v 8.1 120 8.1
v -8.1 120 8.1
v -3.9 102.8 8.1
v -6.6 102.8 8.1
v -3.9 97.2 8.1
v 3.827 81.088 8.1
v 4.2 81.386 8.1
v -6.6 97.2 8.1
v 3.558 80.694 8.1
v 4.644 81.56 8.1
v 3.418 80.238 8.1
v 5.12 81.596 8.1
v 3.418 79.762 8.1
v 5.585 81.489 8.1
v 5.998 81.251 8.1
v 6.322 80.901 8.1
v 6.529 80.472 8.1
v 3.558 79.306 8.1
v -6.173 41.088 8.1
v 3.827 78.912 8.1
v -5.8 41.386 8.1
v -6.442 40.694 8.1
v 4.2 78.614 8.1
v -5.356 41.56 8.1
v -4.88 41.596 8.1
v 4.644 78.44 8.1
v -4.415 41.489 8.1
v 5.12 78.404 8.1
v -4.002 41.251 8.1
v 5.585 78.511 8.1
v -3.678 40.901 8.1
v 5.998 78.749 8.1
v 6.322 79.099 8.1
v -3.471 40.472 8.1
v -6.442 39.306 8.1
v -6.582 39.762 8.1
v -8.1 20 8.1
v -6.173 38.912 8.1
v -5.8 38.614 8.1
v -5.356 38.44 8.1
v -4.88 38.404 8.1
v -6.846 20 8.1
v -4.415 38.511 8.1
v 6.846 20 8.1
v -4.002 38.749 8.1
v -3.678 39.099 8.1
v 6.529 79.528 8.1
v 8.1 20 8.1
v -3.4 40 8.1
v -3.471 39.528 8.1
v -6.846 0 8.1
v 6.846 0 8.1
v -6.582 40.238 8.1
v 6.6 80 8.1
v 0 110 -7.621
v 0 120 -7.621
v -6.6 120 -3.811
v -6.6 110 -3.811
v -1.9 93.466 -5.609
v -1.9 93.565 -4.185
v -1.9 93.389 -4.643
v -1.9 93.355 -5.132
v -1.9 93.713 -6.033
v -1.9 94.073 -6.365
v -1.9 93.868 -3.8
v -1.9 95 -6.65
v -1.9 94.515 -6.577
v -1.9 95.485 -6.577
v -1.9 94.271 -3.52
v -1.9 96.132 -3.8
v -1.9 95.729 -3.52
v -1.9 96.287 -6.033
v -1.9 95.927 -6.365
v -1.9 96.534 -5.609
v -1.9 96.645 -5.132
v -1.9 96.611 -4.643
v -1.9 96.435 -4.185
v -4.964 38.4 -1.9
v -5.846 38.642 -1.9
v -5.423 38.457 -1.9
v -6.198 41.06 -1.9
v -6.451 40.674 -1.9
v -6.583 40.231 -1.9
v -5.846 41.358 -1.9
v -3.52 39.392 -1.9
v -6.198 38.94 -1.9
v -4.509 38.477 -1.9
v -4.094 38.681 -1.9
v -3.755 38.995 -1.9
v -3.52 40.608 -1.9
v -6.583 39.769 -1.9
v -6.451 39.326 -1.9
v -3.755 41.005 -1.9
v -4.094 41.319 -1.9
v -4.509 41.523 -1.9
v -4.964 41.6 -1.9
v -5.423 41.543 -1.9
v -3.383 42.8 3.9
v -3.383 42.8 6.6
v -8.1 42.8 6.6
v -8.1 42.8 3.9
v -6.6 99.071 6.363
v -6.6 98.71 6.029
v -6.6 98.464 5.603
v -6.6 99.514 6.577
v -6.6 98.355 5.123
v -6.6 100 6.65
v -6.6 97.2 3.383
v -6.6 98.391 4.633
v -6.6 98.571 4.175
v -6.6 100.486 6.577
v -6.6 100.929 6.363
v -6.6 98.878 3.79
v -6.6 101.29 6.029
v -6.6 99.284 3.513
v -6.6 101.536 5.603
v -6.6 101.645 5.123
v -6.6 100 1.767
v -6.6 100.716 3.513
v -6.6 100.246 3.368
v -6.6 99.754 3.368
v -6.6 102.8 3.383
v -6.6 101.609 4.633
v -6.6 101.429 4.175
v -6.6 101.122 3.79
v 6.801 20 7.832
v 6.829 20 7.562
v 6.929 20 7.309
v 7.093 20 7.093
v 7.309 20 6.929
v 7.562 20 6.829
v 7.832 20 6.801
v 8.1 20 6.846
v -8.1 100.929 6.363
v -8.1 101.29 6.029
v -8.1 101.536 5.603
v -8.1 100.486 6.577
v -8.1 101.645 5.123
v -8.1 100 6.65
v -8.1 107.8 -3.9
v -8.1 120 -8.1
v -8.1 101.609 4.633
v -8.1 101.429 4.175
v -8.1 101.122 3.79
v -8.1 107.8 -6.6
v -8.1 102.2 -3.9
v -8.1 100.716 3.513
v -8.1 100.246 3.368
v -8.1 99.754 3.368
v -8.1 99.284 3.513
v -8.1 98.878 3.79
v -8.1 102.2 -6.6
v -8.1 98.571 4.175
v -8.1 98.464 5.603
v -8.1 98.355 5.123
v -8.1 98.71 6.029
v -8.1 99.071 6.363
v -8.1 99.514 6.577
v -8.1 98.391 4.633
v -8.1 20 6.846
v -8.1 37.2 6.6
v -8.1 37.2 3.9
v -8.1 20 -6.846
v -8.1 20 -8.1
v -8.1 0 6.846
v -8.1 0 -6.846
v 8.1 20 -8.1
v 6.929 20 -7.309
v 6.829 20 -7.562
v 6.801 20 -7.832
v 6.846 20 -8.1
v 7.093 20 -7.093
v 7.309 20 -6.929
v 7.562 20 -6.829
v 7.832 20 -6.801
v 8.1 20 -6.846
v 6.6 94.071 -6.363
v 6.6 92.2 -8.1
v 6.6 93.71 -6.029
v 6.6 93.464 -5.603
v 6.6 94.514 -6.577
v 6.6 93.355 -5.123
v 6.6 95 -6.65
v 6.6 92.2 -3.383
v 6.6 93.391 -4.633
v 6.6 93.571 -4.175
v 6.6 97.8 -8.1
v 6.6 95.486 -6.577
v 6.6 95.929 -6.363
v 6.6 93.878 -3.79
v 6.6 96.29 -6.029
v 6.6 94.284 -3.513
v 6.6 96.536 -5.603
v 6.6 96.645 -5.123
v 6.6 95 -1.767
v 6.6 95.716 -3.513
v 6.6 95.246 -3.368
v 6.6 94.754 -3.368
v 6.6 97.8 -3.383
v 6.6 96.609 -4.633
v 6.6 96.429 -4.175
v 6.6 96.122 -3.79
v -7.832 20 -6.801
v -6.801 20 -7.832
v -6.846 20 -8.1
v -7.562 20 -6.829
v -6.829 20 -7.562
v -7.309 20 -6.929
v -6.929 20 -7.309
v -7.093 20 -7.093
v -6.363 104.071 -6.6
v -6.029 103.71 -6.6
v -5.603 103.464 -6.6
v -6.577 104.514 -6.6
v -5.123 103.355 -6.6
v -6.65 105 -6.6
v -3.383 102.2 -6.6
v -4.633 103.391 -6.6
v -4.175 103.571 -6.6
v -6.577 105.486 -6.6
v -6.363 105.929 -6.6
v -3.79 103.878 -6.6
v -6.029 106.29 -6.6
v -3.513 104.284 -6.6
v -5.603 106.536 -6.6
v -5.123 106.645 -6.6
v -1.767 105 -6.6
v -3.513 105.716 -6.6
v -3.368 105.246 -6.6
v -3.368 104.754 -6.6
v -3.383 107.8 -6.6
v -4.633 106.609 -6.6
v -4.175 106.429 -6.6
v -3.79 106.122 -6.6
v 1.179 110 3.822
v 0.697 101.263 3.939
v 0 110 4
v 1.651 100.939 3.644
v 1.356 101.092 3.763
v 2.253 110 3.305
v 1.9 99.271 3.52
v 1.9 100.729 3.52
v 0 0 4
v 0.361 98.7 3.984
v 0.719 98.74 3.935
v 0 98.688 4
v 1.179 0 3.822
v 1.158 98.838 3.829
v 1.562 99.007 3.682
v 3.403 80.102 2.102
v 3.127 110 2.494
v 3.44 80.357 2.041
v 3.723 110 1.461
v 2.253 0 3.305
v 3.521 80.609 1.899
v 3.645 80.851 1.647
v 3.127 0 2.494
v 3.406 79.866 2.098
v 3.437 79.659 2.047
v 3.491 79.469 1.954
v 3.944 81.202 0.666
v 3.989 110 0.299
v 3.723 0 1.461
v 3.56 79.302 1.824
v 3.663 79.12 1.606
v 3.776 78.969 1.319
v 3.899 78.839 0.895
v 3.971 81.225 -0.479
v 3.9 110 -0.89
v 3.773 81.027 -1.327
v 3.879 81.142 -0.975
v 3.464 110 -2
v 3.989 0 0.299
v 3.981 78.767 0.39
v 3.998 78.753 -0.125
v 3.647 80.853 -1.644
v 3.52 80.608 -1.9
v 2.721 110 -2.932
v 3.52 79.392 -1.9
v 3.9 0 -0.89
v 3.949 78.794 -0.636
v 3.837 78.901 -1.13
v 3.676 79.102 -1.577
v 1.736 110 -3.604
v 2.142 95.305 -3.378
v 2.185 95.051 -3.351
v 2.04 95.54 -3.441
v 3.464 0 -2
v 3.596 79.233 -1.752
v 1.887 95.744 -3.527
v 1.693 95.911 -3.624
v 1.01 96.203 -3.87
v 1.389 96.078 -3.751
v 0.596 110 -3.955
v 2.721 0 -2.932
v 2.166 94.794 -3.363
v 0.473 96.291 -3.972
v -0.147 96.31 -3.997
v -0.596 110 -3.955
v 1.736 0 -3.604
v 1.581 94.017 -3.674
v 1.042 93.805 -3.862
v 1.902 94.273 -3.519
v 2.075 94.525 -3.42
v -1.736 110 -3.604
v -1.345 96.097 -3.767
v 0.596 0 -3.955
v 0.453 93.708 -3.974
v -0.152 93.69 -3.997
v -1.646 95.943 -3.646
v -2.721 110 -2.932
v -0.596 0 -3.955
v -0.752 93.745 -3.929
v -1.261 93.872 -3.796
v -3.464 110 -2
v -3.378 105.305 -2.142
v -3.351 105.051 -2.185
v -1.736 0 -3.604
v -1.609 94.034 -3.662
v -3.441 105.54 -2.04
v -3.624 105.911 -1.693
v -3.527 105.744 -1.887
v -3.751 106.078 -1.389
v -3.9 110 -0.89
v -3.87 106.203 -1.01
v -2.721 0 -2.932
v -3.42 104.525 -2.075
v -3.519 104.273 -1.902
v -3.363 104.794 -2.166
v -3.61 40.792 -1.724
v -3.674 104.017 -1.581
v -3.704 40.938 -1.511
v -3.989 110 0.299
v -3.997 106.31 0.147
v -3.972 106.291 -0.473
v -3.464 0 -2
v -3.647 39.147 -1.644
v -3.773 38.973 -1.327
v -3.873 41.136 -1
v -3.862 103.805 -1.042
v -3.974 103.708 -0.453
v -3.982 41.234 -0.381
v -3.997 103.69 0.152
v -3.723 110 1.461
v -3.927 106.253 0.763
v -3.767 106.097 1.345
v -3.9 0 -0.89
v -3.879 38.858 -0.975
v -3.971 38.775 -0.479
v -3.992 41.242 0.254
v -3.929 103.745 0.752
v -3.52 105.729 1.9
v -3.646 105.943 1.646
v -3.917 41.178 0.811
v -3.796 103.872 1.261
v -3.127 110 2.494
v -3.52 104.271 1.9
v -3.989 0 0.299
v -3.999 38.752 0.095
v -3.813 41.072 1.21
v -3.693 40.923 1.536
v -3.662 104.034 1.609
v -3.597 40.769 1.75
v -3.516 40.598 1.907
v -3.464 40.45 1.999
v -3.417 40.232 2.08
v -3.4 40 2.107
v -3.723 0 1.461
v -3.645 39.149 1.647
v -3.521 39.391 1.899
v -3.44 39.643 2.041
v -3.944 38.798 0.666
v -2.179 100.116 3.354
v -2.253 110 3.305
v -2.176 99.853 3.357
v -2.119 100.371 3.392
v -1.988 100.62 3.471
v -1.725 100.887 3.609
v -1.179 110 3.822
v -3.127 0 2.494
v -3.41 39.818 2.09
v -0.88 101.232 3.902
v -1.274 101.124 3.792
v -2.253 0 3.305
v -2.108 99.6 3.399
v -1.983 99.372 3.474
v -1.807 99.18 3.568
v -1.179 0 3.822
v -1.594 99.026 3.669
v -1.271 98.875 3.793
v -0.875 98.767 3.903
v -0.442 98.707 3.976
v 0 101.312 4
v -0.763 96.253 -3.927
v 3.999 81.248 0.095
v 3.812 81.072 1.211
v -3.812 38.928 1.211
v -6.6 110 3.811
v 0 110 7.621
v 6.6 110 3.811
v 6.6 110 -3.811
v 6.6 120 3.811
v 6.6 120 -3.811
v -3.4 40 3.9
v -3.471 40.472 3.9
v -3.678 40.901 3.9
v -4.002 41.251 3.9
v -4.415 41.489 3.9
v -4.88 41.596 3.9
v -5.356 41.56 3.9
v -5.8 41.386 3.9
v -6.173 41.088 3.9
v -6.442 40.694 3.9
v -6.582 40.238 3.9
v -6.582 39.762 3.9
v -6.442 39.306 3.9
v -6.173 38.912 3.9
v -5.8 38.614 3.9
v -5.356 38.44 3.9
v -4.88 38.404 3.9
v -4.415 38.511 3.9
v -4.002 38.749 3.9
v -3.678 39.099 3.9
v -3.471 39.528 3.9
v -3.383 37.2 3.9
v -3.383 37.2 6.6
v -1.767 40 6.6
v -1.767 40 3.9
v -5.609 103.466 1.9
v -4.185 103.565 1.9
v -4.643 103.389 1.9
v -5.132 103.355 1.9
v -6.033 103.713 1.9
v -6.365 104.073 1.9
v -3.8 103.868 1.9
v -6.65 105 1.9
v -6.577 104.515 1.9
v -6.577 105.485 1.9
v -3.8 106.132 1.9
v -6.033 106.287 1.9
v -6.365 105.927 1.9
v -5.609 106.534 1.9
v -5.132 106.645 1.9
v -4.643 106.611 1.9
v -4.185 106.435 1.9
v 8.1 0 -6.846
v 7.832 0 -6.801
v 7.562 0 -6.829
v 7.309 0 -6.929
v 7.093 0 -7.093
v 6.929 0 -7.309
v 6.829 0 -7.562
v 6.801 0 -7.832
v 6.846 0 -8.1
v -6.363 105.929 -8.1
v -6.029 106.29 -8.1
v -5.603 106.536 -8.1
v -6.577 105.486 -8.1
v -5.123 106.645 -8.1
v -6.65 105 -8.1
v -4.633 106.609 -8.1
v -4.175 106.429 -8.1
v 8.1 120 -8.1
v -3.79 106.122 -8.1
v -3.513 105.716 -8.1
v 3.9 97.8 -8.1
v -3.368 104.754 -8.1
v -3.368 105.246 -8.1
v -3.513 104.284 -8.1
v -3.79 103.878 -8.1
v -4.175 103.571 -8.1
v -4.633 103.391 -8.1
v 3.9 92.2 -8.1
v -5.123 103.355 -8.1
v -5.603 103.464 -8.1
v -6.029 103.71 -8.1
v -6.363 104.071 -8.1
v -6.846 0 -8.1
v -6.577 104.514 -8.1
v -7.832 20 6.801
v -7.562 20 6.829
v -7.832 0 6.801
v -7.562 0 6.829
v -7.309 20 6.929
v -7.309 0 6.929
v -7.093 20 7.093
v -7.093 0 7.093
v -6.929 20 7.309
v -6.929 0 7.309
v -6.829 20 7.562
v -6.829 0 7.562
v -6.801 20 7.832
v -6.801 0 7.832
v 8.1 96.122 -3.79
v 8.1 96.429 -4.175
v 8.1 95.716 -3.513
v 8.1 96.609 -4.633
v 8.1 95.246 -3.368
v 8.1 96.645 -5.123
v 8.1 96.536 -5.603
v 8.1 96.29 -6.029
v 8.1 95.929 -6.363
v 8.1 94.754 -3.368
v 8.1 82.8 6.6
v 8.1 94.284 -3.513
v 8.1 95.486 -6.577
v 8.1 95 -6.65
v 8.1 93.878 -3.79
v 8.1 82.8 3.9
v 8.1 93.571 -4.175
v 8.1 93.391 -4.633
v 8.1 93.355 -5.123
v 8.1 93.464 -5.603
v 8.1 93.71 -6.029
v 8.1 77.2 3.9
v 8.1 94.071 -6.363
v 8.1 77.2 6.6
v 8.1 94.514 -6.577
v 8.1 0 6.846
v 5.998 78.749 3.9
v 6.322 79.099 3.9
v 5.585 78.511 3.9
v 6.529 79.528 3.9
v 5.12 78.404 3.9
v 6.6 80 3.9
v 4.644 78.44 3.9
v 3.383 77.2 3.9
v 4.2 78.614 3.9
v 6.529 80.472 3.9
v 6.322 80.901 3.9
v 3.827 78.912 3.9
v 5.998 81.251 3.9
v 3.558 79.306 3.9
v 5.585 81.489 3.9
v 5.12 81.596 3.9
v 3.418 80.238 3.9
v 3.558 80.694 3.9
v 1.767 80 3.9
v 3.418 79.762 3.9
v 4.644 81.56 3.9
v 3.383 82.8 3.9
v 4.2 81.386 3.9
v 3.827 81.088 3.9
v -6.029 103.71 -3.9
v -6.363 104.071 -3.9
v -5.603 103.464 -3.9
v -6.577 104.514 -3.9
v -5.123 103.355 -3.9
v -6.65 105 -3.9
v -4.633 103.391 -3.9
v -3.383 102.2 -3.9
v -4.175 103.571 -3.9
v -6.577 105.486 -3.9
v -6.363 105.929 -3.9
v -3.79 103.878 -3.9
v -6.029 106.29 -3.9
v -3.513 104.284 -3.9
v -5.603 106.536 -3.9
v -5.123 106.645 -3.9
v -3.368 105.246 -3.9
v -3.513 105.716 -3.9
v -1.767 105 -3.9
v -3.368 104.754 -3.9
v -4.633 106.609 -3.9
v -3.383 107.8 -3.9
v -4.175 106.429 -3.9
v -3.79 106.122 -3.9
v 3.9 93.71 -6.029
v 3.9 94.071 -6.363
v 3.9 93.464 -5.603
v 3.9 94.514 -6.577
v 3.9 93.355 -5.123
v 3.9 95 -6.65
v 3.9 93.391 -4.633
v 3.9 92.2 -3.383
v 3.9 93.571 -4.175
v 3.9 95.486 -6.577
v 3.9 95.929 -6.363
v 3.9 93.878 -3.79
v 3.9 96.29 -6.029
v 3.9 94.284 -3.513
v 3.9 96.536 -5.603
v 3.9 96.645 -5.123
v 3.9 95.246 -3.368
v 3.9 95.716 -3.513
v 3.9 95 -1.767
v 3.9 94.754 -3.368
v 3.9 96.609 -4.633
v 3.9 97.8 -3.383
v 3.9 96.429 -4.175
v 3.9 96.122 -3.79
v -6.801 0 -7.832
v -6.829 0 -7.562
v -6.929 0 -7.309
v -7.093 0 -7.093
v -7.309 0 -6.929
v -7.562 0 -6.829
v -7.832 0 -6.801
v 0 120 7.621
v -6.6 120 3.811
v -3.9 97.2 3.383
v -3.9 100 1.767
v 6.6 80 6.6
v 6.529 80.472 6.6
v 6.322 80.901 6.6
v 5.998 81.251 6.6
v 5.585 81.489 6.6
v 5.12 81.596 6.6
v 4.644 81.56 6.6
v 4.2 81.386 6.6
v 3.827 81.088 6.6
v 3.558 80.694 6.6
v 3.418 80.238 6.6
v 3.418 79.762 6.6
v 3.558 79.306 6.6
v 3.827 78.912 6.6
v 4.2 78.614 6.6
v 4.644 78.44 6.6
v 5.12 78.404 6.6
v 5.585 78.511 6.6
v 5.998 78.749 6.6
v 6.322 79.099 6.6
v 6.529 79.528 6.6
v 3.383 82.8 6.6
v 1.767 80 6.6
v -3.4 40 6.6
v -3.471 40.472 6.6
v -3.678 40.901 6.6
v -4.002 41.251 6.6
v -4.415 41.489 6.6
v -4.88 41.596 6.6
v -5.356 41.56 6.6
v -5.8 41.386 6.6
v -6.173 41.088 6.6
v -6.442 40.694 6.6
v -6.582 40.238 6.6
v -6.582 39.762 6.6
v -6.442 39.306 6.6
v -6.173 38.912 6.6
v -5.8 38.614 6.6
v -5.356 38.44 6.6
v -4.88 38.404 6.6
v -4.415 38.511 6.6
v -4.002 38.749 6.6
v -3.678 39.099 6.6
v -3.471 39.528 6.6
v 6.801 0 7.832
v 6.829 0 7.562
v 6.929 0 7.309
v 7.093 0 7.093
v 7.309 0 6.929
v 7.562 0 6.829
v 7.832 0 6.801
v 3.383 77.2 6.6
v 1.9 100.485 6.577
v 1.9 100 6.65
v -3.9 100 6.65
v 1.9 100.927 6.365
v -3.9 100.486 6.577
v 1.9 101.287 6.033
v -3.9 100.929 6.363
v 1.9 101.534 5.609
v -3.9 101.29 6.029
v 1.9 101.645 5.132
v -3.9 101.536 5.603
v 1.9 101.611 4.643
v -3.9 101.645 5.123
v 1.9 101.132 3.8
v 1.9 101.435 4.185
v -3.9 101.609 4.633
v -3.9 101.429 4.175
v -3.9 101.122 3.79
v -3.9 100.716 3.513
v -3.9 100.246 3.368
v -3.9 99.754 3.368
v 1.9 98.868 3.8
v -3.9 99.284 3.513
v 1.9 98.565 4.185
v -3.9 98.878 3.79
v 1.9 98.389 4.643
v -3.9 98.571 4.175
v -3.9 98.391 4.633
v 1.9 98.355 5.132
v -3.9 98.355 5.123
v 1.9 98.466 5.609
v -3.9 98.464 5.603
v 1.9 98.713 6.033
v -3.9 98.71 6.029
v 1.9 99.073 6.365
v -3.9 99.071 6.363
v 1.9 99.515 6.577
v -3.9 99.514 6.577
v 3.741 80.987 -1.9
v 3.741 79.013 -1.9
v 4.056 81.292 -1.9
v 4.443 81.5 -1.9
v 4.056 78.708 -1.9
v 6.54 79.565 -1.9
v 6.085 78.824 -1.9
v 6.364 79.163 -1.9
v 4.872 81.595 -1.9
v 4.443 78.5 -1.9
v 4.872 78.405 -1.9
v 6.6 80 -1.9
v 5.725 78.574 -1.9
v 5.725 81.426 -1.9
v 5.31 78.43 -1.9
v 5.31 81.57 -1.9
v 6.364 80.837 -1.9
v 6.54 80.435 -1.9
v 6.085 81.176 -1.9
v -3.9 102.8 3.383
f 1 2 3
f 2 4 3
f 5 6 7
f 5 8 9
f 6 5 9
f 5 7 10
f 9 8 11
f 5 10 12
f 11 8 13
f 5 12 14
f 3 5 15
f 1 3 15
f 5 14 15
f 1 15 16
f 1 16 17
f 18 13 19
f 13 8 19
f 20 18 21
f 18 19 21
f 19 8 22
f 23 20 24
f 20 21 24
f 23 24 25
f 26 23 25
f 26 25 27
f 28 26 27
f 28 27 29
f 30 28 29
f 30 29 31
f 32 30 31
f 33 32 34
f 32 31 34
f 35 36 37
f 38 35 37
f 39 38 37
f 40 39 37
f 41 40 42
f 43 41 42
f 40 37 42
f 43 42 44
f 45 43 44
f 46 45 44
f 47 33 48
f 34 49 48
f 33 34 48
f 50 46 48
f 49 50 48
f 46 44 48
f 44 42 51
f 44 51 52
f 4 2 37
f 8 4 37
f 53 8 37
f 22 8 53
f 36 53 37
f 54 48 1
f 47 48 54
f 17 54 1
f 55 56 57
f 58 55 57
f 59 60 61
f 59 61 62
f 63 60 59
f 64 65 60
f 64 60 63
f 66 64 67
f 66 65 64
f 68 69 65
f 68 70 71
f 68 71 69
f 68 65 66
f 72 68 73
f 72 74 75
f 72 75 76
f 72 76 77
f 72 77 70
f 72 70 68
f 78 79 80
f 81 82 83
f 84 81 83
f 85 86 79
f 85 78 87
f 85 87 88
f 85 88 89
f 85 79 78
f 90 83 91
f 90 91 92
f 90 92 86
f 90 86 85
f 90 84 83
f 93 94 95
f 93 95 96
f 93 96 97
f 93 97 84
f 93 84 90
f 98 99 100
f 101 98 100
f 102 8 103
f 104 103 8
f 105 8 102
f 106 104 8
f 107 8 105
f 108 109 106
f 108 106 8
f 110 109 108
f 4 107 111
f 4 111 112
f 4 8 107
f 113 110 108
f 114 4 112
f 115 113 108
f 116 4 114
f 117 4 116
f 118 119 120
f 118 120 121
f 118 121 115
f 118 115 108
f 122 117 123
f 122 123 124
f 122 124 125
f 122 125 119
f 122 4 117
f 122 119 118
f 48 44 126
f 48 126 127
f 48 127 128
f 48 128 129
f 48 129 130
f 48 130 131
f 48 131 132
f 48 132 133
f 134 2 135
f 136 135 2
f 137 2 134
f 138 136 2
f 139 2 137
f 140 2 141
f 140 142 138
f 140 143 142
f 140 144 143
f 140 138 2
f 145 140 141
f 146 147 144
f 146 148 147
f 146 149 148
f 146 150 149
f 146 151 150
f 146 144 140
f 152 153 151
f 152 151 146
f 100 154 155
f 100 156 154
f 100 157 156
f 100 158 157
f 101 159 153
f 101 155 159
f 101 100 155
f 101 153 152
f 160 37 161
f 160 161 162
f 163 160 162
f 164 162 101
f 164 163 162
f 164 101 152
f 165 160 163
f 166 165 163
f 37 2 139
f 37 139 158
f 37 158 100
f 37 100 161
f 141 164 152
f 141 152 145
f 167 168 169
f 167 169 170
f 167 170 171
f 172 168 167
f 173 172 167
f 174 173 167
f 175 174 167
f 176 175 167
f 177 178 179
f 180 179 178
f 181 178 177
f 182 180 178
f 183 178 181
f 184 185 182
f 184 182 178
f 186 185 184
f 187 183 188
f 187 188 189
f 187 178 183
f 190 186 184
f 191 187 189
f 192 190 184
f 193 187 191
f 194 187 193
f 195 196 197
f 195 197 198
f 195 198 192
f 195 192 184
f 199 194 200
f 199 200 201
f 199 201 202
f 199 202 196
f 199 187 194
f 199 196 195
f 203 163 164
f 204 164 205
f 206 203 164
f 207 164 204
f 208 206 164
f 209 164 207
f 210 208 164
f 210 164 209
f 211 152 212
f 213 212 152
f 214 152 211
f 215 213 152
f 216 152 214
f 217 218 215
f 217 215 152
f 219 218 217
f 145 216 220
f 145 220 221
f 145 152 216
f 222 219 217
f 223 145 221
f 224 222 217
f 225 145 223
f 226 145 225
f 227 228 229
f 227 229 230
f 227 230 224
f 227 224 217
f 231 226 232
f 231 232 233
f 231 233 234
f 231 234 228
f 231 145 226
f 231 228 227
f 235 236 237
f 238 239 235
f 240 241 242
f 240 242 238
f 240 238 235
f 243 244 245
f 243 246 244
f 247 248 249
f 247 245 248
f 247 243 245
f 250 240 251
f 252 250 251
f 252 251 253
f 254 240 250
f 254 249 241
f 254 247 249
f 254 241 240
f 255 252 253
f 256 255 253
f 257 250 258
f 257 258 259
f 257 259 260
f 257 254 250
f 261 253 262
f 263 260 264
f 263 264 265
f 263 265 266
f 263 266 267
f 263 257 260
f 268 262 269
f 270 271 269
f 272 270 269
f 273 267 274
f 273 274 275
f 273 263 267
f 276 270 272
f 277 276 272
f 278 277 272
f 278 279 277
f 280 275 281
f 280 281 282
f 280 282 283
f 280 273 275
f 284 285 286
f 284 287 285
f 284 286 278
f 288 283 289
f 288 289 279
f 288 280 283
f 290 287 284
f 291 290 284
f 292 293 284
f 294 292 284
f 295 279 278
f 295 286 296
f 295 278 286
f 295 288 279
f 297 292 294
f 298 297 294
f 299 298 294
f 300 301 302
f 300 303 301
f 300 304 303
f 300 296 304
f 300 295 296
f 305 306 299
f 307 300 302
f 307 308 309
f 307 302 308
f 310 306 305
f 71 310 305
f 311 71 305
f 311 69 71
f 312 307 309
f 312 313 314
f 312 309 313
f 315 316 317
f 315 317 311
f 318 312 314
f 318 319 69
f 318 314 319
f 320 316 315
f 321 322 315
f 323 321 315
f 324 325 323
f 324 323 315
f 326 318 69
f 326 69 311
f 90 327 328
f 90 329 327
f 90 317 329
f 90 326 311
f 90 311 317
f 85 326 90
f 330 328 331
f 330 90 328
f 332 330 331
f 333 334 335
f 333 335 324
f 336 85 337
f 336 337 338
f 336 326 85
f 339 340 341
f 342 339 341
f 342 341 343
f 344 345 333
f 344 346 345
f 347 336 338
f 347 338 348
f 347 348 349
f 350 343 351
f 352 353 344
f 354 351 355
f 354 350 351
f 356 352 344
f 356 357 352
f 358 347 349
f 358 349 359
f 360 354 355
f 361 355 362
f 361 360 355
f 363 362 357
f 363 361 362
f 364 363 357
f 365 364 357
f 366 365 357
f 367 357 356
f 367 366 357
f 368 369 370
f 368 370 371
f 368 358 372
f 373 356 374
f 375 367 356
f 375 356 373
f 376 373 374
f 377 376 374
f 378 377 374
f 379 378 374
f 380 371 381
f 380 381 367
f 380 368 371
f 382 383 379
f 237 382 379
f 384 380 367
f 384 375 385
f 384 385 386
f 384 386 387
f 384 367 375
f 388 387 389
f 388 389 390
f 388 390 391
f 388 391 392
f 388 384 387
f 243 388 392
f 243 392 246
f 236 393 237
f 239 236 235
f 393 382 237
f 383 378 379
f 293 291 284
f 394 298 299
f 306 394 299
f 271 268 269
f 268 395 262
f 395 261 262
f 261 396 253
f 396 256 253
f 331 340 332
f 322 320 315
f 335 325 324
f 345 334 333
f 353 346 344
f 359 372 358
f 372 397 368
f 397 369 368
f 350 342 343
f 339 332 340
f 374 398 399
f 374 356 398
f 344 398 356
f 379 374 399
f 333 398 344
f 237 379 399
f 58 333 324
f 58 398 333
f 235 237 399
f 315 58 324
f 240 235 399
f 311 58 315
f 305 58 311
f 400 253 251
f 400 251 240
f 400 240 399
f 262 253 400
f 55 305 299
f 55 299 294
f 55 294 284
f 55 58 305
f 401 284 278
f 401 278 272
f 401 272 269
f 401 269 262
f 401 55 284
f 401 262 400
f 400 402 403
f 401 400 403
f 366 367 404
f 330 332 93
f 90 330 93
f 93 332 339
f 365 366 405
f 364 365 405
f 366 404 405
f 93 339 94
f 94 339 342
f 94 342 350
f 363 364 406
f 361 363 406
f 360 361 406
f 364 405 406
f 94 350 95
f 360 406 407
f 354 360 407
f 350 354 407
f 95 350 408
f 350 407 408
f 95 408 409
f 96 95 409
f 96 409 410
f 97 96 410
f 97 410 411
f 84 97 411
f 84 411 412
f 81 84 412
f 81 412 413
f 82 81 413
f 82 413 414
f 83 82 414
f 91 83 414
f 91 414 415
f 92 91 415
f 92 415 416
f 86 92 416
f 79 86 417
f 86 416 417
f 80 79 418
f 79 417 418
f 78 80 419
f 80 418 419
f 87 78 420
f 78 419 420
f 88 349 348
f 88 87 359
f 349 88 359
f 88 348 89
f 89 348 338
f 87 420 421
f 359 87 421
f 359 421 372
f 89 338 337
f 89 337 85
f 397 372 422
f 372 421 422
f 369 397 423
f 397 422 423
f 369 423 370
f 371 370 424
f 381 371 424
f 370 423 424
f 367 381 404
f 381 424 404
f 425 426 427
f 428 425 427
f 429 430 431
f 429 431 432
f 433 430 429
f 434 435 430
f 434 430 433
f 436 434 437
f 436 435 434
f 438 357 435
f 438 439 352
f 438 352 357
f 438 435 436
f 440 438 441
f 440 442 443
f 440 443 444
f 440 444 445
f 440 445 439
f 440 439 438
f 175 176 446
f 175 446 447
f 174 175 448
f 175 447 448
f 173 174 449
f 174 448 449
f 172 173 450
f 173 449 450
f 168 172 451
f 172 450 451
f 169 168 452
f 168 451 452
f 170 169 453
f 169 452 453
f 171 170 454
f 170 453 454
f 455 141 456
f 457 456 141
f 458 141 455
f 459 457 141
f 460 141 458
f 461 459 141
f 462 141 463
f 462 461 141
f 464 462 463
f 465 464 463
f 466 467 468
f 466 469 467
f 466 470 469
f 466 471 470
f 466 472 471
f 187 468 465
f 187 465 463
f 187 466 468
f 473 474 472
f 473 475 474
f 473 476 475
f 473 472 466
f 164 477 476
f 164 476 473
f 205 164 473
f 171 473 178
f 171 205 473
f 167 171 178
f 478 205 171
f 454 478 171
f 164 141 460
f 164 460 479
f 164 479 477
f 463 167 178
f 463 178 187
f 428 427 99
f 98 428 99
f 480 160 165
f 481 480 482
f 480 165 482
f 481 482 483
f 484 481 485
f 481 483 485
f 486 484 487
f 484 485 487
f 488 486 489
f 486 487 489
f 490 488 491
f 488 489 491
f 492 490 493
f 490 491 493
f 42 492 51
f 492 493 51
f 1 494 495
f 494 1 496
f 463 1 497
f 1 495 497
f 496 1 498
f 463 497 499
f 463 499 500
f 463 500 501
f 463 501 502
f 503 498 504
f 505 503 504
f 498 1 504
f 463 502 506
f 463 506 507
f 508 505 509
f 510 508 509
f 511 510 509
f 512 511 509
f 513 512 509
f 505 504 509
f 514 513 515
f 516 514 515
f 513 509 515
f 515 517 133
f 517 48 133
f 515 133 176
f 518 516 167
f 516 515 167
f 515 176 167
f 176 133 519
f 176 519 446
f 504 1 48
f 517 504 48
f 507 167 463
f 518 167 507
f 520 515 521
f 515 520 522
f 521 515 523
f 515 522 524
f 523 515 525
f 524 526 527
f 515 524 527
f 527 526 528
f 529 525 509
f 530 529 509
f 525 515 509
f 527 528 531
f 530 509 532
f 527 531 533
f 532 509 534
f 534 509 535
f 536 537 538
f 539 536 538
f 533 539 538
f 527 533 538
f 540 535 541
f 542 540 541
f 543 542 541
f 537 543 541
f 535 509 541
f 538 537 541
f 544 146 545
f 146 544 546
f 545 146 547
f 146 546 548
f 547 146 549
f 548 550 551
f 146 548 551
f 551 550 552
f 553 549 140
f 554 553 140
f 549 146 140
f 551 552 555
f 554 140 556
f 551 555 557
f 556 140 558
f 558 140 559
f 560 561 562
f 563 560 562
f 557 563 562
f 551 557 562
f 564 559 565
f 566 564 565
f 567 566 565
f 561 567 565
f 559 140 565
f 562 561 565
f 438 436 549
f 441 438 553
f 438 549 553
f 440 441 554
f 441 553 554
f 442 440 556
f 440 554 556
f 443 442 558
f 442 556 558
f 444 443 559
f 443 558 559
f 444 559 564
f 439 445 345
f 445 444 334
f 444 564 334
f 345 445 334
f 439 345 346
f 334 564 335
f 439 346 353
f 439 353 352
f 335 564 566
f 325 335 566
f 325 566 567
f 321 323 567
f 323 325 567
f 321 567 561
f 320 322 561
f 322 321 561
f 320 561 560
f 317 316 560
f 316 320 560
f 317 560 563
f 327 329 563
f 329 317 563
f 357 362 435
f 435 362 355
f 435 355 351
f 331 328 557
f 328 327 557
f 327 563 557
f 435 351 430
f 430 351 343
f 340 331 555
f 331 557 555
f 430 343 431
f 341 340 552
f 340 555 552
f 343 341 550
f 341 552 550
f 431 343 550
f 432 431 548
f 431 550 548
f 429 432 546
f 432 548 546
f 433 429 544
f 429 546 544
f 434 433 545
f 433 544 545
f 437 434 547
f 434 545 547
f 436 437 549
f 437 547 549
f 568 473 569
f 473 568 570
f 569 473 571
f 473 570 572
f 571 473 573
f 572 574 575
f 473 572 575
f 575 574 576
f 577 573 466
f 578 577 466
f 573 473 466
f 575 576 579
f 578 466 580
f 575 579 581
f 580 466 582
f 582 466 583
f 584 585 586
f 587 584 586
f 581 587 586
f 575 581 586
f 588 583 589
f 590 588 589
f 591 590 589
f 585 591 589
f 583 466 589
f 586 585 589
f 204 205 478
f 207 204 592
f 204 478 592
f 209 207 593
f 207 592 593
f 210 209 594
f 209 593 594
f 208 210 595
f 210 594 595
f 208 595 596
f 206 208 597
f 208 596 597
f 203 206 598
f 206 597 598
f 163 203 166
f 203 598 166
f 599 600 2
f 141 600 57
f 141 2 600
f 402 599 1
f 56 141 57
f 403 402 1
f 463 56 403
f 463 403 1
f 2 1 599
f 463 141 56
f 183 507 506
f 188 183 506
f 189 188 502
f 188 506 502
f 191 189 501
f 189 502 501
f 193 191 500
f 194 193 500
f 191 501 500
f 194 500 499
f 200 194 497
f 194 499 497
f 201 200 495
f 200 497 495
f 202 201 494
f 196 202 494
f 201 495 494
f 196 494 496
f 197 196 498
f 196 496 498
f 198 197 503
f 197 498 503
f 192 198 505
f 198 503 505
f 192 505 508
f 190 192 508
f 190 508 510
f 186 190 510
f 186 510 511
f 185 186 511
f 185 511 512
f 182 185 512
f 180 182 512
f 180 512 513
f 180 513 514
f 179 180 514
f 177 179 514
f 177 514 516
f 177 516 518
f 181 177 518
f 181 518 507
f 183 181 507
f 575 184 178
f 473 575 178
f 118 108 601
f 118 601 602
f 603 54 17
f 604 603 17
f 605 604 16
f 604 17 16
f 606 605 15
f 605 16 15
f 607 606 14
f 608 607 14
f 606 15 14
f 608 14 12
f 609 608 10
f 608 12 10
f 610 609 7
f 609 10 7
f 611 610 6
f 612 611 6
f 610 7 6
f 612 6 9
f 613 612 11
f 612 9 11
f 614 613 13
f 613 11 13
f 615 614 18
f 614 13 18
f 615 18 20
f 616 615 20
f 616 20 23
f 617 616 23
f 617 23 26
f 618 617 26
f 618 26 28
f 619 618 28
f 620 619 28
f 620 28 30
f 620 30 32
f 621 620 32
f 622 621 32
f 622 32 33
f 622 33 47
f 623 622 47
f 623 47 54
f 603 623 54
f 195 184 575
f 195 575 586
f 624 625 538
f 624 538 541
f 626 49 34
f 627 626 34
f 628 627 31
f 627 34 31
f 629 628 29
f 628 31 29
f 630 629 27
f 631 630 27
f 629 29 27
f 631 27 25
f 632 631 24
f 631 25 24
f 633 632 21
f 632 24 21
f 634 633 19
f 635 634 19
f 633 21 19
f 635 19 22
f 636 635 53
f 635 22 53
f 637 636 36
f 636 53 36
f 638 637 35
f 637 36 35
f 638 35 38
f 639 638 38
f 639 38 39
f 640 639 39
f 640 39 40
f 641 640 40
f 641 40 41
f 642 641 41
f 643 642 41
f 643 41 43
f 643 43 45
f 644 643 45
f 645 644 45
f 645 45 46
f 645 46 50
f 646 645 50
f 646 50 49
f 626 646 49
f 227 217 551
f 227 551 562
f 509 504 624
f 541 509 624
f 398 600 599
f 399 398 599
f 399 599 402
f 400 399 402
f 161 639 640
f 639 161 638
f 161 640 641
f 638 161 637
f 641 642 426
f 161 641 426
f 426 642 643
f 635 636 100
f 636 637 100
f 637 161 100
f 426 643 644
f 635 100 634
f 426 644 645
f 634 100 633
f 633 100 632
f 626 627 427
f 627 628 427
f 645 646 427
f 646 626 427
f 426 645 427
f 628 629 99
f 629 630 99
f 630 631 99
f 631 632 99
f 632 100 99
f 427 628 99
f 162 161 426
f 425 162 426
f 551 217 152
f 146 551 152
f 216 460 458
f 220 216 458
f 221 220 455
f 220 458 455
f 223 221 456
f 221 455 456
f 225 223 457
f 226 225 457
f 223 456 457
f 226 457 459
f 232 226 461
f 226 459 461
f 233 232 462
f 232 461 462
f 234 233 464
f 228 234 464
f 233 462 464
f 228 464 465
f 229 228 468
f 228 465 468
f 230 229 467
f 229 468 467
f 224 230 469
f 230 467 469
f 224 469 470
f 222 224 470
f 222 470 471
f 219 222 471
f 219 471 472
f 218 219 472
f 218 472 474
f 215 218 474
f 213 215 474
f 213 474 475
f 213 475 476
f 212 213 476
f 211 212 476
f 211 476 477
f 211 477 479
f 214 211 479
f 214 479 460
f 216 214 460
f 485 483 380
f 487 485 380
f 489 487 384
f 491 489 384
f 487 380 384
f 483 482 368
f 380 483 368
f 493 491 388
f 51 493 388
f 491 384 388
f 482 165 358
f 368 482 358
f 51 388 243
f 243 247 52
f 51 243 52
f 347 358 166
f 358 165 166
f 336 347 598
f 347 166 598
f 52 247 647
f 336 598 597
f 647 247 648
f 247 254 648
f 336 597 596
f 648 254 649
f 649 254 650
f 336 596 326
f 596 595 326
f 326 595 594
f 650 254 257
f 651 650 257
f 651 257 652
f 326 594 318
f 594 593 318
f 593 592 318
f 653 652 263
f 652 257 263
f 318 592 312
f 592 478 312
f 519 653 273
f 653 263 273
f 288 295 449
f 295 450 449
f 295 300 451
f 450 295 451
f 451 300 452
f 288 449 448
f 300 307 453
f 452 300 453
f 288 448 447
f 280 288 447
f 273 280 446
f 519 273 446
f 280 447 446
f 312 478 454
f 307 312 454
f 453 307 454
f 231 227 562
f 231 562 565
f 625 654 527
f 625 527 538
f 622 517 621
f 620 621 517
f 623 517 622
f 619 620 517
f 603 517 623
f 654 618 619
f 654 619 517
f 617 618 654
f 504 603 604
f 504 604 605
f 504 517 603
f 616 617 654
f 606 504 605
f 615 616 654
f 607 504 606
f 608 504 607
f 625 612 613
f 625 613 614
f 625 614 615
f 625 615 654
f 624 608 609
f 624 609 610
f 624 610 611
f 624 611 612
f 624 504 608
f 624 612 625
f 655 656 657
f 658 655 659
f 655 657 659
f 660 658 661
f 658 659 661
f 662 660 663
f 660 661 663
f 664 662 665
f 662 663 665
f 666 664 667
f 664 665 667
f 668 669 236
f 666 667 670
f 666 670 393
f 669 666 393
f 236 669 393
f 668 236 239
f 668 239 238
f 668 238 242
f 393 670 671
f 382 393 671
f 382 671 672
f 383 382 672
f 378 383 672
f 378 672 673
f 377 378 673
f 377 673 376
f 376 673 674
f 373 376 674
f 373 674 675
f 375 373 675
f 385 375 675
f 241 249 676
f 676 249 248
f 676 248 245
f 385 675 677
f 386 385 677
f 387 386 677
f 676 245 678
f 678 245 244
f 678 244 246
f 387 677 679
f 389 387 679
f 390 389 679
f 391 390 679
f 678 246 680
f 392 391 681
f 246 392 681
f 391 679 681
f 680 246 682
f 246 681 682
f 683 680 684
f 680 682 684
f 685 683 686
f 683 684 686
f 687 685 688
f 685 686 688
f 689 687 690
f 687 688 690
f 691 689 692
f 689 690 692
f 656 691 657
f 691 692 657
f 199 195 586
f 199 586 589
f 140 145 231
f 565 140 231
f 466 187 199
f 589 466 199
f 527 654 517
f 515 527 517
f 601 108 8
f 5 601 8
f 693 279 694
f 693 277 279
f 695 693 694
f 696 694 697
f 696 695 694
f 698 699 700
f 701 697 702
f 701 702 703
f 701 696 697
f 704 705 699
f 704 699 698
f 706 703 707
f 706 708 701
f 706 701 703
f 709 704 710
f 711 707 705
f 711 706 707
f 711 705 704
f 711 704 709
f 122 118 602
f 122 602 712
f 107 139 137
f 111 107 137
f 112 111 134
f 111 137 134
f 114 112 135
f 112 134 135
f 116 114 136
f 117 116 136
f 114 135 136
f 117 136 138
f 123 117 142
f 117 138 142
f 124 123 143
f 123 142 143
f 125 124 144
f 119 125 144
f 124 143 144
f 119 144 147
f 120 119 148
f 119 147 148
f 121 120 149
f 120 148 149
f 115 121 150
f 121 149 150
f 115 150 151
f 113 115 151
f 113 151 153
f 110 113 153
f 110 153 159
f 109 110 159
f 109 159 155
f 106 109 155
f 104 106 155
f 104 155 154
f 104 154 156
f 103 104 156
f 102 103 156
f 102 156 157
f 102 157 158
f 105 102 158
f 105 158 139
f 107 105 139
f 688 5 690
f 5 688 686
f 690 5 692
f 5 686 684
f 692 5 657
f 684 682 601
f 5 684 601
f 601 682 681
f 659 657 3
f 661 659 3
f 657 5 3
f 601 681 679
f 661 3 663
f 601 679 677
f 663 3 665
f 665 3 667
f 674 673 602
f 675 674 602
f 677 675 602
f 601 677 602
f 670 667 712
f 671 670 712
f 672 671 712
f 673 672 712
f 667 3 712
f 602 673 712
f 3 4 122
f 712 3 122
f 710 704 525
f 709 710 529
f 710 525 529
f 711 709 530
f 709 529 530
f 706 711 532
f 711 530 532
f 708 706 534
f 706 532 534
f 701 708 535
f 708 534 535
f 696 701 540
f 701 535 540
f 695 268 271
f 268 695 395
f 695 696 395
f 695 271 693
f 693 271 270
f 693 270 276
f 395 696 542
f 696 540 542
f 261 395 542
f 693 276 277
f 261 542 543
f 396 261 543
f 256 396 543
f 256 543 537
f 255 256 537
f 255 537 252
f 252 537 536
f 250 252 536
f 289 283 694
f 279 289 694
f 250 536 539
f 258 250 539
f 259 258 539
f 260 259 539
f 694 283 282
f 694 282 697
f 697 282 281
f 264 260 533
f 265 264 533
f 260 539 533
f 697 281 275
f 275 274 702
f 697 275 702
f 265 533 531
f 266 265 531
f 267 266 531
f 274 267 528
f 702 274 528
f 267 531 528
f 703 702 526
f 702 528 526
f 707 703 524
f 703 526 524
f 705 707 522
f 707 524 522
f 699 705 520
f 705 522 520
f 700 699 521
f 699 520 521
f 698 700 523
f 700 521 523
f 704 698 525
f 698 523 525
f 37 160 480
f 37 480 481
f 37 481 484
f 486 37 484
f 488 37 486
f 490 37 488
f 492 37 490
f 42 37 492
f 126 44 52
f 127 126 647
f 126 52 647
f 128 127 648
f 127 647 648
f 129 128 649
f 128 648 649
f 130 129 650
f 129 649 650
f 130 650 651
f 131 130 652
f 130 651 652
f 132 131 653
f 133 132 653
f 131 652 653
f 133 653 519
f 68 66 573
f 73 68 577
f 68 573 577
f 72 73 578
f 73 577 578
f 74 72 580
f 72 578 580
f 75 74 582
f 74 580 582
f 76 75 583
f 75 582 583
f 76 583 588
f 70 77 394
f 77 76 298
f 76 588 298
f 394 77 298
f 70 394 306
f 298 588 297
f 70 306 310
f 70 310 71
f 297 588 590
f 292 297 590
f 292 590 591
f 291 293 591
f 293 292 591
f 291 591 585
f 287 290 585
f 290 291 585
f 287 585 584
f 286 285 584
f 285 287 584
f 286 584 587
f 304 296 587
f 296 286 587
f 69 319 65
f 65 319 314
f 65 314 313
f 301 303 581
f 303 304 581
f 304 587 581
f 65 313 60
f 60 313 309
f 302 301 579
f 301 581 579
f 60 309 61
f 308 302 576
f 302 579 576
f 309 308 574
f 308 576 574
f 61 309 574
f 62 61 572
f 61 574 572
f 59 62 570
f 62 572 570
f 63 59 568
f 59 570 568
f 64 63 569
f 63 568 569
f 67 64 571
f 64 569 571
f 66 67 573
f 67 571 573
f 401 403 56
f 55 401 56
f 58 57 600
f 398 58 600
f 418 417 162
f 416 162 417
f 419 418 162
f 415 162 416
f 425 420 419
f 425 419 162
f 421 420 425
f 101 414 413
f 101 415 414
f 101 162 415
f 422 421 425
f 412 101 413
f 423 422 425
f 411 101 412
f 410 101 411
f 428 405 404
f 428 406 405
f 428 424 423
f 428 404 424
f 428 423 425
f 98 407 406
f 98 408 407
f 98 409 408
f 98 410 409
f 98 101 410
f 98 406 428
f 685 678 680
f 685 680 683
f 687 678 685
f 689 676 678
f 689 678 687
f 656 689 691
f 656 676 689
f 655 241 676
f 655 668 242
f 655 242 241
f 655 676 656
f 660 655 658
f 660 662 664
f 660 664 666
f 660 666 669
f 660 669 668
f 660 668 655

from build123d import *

# Parameters (mm, degrees)
SKETCH_1_W           = 16.2
SKETCH_1_H           = 16.2
SKETCH_1_R           = 4
EXTRUDE_1_DEPTH      = 120
SKETCH_2_R           = 1
CUT_EXTRUDE_1_DEPTH  = 20
CUT_EXTRUDE_2_DEPTH  = 10
SKETCH_4_R           = 1.6
CUT_EXTRUDE_3_DEPTH  = 10
CUT_EXTRUDE_4_DEPTH  = 2.7
SKETCH_6_R           = 1.65
CUT_EXTRUDE_5_DEPTH  = 10
CUT_EXTRUDE_6_DEPTH  = 2.7
SKETCH_9_R           = 1.65
CUT_EXTRUDE_7_DEPTH  = 10
CUT_EXTRUDE_8_DEPTH  = 2.7
SKETCH_11_R          = 1.65
CUT_EXTRUDE_9_DEPTH  = 10
CUT_EXTRUDE_10_DEPTH = 2.7


with BuildPart() as part:
    # Эскиз1 → Бобышка-Вытянуть1 (new body)
    with BuildSketch(Plane(origin=(0, 0, 0), x_dir=(1, 0, 0), z_dir=(0, 1, 0))):
        Rectangle(SKETCH_1_W, SKETCH_1_H)
        with Locations(Location((0, 0, 0), (0, 0, 270))):
            Circle(SKETCH_1_R, mode=Mode.SUBTRACT)
    extrude(amount=EXTRUDE_1_DEPTH)

    # Эскиз2 → Вырез-Вытянуть1 (cut)
    with BuildSketch(Plane.XZ):
        with Locations((-7.8, -7.8)):
            Circle(SKETCH_2_R)
        with Locations((-7.8, 7.8)):
            Circle(SKETCH_2_R)
        with Locations((7.8, 7.8)):
            Circle(SKETCH_2_R)
        with Locations((7.8, -7.8)):
            Circle(SKETCH_2_R)
    extrude(amount=-CUT_EXTRUDE_1_DEPTH, mode=Mode.SUBTRACT)

    # Эскиз3 → Вырез-Вытянуть2 (cut)
    with BuildSketch(Plane(origin=(0, 120, 0), x_dir=(1, 0, 0), z_dir=(0, 1, 0))):
        Polygon((0, 7.621023553), (-6.6, 3.810511777), (-6.6, -3.810511777), (0, -7.621023553), (6.6, -3.810511777), (6.6, 3.810511777), align=None)
    extrude(amount=-CUT_EXTRUDE_2_DEPTH, mode=Mode.SUBTRACT)

    # Эскиз4 → Вырез-Вытянуть3 (cut)
    with BuildSketch(Plane.XY.offset(8.1)):
        with Locations((-5, 40)):
            Circle(SKETCH_4_R)
        with Locations((5, 80)):
            Circle(SKETCH_4_R)
    extrude(amount=-CUT_EXTRUDE_3_DEPTH, mode=Mode.SUBTRACT)

    # Эскиз5 → Вырез-Вытянуть4 (cut)
    with BuildSketch(Plane.XY.offset(6.6)):
        Polygon((-6.616580754, 42.8), (-8.1, 42.8), (-8.1, 37.2), (-6.616580754, 37.2), (-3.383419246, 37.2), (-1.766838493, 40), (-3.383419246, 42.8), align=None)
        Polygon((6.616580754, 82.8), (8.1, 82.8), (8.1, 77.2), (6.616580754, 77.2), (3.383419246, 77.2), (1.766838493, 80), (3.383419246, 82.8), align=None)
    extrude(amount=-CUT_EXTRUDE_4_DEPTH, mode=Mode.SUBTRACT)

    # Эскиз6 → Вырез-Вытянуть5 (cut)
    with BuildSketch(Plane(origin=(0, 0, -8.1), x_dir=(-1, 0, 0), z_dir=(0, 0, -1))):
        with Locations((5, 105)):
            Circle(SKETCH_6_R)
    extrude(amount=-CUT_EXTRUDE_5_DEPTH, mode=Mode.SUBTRACT)

    # Эскиз7 → Вырез-Вытянуть6 (cut)
    with BuildSketch(Plane(origin=(0, 0, -6.6), x_dir=(-1, 0, 0), z_dir=(0, 0, -1))):
        Polygon((6.616580754, 107.8), (8.1, 107.8), (8.1, 102.2), (6.616580754, 102.2), (3.383419246, 102.2), (1.766838493, 105), (3.383419246, 107.8), align=None)
    extrude(amount=-CUT_EXTRUDE_6_DEPTH, mode=Mode.SUBTRACT)

    # Эскиз9 → Вырез-Вытянуть7 (cut)
    with BuildSketch(Plane.ZY.offset(8.1)):
        with Locations((5, 100)):
            Circle(SKETCH_9_R)
    extrude(amount=-CUT_EXTRUDE_7_DEPTH, mode=Mode.SUBTRACT)

    # Эскиз10 → Вырез-Вытянуть8 (cut)
    with BuildSketch(Plane.ZY.offset(6.6)):
        Polygon((6.616580754, 102.8), (8.1, 102.8), (8.1, 97.2), (6.616580754, 97.2), (3.383419246, 97.2), (1.766838493, 100), (3.383419246, 102.8), align=None)
    extrude(amount=-CUT_EXTRUDE_8_DEPTH, mode=Mode.SUBTRACT)

    # Эскиз11 → Вырез-Вытянуть9 (cut)
    with BuildSketch(Plane(origin=(8.1, 0, 0), x_dir=(0, 0, -1), z_dir=(1, 0, 0))):
        with Locations((5, 95)):
            Circle(SKETCH_11_R)
    extrude(amount=-CUT_EXTRUDE_9_DEPTH, mode=Mode.SUBTRACT)

    # Эскиз12 → Вырез-Вытянуть10 (cut)
    with BuildSketch(Plane(origin=(6.6, 0, 0), x_dir=(0, 0, -1), z_dir=(1, 0, 0))):
        Polygon((6.616580754, 97.8), (8.1, 97.8), (8.1, 92.2), (6.616580754, 92.2), (3.383419246, 92.2), (1.766838493, 95), (3.383419246, 97.8), align=None)
    extrude(amount=-CUT_EXTRUDE_10_DEPTH, mode=Mode.SUBTRACT)


solid = part.part
